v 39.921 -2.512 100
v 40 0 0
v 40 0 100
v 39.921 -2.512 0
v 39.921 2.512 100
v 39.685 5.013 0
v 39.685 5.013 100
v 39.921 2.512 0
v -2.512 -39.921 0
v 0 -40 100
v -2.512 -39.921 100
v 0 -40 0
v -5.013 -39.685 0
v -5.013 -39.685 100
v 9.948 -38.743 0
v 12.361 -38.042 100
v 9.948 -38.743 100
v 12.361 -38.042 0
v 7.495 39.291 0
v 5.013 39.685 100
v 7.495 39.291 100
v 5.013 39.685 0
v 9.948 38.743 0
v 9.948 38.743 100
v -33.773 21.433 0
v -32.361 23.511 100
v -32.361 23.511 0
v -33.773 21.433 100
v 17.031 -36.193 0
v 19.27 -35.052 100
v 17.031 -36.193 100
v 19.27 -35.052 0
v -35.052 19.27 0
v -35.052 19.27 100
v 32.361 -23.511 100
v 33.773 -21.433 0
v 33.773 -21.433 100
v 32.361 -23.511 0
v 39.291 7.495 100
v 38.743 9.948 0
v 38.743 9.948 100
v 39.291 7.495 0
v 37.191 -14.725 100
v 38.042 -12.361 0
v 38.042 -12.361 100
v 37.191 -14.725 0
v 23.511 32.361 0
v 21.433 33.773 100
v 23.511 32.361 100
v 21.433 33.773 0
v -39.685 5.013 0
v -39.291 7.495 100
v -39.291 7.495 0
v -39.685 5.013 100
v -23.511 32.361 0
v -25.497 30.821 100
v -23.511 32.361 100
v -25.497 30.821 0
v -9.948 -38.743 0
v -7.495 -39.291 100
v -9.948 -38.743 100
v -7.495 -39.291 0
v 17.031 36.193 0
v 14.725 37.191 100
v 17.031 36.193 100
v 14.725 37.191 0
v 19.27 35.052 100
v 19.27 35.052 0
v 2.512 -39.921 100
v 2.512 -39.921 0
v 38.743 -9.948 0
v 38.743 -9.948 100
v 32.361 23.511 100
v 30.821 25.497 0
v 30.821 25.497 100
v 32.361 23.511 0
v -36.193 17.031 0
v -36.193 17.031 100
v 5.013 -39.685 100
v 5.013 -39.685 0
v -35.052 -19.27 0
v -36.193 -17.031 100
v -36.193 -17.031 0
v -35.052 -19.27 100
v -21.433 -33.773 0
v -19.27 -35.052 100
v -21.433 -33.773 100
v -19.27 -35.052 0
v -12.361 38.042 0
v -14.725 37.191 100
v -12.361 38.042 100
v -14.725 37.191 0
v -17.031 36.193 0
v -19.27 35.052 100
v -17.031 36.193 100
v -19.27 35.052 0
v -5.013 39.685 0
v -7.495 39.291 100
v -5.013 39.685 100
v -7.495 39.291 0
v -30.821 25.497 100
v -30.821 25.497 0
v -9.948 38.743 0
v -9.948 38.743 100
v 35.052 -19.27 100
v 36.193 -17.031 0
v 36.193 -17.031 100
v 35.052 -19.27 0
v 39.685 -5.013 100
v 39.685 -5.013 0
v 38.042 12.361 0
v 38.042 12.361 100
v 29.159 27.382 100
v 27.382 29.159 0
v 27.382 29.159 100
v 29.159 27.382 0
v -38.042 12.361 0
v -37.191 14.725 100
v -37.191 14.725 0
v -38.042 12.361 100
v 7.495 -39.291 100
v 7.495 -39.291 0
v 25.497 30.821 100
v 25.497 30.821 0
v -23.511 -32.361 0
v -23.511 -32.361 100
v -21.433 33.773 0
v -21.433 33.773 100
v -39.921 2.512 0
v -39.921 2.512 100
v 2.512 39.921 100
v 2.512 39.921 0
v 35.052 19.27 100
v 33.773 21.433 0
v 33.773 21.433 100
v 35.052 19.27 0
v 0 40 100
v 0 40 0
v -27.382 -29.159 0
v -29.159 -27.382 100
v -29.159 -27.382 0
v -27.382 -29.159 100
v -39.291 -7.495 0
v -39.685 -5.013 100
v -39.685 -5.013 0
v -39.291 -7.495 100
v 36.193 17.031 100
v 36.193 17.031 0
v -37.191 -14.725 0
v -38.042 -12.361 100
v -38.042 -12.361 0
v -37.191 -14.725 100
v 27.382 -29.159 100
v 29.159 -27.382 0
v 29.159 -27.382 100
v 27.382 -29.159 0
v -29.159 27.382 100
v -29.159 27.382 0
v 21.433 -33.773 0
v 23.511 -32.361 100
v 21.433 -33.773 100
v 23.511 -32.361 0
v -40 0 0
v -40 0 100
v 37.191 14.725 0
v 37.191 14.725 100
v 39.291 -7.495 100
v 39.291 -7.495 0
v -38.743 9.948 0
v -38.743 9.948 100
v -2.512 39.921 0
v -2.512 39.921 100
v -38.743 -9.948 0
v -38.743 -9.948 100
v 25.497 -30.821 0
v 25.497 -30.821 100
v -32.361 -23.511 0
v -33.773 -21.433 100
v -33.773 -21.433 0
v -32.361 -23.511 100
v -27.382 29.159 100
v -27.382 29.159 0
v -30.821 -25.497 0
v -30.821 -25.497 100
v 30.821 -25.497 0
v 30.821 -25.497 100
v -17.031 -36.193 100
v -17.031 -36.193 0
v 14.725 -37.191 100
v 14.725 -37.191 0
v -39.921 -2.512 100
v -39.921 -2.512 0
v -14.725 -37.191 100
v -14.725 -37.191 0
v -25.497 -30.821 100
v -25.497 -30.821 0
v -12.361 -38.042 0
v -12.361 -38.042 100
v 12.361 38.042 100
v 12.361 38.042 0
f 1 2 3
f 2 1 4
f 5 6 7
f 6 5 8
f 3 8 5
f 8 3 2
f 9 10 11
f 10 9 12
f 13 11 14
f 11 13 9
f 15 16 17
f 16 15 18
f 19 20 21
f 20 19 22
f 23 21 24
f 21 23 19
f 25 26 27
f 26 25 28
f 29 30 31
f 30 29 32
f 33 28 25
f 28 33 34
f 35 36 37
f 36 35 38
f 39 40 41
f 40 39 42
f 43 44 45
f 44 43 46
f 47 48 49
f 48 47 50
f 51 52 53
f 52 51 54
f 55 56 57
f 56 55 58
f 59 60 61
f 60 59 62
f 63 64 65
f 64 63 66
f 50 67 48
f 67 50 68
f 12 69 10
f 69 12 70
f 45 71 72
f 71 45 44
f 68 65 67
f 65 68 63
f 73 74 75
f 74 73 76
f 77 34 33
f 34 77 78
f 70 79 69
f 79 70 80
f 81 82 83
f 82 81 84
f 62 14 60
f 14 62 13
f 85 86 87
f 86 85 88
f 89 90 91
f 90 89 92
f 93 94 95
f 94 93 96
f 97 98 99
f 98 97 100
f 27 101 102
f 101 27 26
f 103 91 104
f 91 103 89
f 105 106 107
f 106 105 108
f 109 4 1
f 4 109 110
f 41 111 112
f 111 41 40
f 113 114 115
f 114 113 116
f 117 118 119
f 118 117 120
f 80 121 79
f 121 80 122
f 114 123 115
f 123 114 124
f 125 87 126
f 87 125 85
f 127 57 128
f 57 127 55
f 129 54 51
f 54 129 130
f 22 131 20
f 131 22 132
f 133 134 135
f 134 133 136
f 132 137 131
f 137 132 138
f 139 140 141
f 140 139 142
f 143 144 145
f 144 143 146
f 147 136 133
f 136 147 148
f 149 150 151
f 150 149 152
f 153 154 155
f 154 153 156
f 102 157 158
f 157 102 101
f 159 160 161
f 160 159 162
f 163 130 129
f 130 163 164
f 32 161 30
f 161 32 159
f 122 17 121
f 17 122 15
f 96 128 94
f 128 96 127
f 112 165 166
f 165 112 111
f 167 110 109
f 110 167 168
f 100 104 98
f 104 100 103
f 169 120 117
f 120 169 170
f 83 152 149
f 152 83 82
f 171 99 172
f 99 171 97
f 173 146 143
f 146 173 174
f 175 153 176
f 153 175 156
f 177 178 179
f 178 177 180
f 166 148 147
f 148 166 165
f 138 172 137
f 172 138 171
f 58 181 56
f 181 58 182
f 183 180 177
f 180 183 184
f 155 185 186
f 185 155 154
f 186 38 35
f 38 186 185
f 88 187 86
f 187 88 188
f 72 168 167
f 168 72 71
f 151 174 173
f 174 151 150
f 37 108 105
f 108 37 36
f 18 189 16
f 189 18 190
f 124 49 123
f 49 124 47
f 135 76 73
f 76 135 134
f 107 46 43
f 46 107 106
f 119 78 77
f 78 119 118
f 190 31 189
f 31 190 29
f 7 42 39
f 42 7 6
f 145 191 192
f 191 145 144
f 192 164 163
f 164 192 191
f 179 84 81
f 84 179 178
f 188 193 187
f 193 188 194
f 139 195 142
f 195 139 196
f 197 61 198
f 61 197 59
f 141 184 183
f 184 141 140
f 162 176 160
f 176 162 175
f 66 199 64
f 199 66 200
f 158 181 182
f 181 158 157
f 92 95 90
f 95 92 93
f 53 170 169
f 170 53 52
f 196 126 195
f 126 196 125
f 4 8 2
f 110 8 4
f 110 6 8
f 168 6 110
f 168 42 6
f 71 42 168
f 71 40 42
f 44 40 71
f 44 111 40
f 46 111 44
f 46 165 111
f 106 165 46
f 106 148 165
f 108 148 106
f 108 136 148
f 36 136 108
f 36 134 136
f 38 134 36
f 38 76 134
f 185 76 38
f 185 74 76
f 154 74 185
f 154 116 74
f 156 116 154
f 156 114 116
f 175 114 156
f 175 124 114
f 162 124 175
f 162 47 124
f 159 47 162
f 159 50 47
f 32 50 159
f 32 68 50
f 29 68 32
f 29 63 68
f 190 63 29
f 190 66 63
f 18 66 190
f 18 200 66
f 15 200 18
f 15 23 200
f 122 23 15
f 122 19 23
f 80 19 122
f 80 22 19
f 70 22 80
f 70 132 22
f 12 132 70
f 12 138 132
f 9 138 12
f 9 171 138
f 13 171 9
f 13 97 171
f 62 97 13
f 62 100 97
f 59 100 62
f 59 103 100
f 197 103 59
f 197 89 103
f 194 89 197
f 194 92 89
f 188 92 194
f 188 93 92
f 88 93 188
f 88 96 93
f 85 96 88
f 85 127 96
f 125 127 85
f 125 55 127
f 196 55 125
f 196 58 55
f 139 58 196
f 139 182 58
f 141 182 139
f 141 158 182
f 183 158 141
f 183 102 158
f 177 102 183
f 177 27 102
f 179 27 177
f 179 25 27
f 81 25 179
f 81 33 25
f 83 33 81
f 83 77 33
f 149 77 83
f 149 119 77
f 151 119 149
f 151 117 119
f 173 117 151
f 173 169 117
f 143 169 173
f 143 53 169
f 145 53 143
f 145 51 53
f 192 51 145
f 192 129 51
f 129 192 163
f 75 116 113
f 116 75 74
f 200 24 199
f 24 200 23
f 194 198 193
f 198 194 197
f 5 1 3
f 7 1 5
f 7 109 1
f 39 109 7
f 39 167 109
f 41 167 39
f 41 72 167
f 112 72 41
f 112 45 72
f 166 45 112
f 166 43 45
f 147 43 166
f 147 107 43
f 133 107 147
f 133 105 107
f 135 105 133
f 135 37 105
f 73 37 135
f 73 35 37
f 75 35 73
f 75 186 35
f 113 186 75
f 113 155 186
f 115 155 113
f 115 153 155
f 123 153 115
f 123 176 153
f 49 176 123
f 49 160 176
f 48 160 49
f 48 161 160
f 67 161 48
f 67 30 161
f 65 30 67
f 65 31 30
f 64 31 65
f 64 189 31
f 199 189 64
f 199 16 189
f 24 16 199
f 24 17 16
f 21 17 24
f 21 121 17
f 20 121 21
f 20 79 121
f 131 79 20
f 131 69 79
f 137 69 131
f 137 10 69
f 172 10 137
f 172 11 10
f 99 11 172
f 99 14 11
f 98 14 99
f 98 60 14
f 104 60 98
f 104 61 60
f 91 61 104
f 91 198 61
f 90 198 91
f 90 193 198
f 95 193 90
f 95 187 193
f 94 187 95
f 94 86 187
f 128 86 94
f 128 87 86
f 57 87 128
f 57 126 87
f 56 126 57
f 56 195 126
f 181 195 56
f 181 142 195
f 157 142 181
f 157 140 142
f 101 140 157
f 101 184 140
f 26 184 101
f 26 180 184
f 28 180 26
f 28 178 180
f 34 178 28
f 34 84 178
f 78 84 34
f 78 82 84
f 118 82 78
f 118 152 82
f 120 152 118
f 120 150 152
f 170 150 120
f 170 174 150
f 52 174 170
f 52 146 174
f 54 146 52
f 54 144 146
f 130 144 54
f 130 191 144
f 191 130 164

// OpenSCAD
// マグカップのパラメータ
outer_d = 80;      // 外径
height = 100;      // 高さ
wall_t = 4;        // 壁厚
bottom_t = 6;      // 底厚
handle_offset = 12; // 取手のカップ外壁からの突出量
handle_r = 6;      // 取手チューブの断面半径

module mug() {
    // 外形
    cylinder(h = height, r = outer_d/2, $fn=100);
    // 内部くり抜き
    translate([0,0,bottom_t])
        cylinder(h = height - bottom_t, r = outer_d/2 - wall_t, $fn=100);
}

module handle() {
    // トーラス風の取手 (rotate_extrude)
    translate([outer_d/2 + handle_offset, 0, height/2])
        rotate_extrude($fn=100)
            translate([handle_r, 0, 0])
                circle(r = handle_r, $fn=50);
}

difference() {
    mug();
    // 内部をくり抜く
    translate([0,0,0])
        // 図形を上位で差分扱い（既に内側だけくり抜いているため不要ですが構造示すため）
        // ここは空
        cube([0,0,0]);
}
union() {
    // カップ本体
    mug();
    // 取手を追加
    handle();
}
